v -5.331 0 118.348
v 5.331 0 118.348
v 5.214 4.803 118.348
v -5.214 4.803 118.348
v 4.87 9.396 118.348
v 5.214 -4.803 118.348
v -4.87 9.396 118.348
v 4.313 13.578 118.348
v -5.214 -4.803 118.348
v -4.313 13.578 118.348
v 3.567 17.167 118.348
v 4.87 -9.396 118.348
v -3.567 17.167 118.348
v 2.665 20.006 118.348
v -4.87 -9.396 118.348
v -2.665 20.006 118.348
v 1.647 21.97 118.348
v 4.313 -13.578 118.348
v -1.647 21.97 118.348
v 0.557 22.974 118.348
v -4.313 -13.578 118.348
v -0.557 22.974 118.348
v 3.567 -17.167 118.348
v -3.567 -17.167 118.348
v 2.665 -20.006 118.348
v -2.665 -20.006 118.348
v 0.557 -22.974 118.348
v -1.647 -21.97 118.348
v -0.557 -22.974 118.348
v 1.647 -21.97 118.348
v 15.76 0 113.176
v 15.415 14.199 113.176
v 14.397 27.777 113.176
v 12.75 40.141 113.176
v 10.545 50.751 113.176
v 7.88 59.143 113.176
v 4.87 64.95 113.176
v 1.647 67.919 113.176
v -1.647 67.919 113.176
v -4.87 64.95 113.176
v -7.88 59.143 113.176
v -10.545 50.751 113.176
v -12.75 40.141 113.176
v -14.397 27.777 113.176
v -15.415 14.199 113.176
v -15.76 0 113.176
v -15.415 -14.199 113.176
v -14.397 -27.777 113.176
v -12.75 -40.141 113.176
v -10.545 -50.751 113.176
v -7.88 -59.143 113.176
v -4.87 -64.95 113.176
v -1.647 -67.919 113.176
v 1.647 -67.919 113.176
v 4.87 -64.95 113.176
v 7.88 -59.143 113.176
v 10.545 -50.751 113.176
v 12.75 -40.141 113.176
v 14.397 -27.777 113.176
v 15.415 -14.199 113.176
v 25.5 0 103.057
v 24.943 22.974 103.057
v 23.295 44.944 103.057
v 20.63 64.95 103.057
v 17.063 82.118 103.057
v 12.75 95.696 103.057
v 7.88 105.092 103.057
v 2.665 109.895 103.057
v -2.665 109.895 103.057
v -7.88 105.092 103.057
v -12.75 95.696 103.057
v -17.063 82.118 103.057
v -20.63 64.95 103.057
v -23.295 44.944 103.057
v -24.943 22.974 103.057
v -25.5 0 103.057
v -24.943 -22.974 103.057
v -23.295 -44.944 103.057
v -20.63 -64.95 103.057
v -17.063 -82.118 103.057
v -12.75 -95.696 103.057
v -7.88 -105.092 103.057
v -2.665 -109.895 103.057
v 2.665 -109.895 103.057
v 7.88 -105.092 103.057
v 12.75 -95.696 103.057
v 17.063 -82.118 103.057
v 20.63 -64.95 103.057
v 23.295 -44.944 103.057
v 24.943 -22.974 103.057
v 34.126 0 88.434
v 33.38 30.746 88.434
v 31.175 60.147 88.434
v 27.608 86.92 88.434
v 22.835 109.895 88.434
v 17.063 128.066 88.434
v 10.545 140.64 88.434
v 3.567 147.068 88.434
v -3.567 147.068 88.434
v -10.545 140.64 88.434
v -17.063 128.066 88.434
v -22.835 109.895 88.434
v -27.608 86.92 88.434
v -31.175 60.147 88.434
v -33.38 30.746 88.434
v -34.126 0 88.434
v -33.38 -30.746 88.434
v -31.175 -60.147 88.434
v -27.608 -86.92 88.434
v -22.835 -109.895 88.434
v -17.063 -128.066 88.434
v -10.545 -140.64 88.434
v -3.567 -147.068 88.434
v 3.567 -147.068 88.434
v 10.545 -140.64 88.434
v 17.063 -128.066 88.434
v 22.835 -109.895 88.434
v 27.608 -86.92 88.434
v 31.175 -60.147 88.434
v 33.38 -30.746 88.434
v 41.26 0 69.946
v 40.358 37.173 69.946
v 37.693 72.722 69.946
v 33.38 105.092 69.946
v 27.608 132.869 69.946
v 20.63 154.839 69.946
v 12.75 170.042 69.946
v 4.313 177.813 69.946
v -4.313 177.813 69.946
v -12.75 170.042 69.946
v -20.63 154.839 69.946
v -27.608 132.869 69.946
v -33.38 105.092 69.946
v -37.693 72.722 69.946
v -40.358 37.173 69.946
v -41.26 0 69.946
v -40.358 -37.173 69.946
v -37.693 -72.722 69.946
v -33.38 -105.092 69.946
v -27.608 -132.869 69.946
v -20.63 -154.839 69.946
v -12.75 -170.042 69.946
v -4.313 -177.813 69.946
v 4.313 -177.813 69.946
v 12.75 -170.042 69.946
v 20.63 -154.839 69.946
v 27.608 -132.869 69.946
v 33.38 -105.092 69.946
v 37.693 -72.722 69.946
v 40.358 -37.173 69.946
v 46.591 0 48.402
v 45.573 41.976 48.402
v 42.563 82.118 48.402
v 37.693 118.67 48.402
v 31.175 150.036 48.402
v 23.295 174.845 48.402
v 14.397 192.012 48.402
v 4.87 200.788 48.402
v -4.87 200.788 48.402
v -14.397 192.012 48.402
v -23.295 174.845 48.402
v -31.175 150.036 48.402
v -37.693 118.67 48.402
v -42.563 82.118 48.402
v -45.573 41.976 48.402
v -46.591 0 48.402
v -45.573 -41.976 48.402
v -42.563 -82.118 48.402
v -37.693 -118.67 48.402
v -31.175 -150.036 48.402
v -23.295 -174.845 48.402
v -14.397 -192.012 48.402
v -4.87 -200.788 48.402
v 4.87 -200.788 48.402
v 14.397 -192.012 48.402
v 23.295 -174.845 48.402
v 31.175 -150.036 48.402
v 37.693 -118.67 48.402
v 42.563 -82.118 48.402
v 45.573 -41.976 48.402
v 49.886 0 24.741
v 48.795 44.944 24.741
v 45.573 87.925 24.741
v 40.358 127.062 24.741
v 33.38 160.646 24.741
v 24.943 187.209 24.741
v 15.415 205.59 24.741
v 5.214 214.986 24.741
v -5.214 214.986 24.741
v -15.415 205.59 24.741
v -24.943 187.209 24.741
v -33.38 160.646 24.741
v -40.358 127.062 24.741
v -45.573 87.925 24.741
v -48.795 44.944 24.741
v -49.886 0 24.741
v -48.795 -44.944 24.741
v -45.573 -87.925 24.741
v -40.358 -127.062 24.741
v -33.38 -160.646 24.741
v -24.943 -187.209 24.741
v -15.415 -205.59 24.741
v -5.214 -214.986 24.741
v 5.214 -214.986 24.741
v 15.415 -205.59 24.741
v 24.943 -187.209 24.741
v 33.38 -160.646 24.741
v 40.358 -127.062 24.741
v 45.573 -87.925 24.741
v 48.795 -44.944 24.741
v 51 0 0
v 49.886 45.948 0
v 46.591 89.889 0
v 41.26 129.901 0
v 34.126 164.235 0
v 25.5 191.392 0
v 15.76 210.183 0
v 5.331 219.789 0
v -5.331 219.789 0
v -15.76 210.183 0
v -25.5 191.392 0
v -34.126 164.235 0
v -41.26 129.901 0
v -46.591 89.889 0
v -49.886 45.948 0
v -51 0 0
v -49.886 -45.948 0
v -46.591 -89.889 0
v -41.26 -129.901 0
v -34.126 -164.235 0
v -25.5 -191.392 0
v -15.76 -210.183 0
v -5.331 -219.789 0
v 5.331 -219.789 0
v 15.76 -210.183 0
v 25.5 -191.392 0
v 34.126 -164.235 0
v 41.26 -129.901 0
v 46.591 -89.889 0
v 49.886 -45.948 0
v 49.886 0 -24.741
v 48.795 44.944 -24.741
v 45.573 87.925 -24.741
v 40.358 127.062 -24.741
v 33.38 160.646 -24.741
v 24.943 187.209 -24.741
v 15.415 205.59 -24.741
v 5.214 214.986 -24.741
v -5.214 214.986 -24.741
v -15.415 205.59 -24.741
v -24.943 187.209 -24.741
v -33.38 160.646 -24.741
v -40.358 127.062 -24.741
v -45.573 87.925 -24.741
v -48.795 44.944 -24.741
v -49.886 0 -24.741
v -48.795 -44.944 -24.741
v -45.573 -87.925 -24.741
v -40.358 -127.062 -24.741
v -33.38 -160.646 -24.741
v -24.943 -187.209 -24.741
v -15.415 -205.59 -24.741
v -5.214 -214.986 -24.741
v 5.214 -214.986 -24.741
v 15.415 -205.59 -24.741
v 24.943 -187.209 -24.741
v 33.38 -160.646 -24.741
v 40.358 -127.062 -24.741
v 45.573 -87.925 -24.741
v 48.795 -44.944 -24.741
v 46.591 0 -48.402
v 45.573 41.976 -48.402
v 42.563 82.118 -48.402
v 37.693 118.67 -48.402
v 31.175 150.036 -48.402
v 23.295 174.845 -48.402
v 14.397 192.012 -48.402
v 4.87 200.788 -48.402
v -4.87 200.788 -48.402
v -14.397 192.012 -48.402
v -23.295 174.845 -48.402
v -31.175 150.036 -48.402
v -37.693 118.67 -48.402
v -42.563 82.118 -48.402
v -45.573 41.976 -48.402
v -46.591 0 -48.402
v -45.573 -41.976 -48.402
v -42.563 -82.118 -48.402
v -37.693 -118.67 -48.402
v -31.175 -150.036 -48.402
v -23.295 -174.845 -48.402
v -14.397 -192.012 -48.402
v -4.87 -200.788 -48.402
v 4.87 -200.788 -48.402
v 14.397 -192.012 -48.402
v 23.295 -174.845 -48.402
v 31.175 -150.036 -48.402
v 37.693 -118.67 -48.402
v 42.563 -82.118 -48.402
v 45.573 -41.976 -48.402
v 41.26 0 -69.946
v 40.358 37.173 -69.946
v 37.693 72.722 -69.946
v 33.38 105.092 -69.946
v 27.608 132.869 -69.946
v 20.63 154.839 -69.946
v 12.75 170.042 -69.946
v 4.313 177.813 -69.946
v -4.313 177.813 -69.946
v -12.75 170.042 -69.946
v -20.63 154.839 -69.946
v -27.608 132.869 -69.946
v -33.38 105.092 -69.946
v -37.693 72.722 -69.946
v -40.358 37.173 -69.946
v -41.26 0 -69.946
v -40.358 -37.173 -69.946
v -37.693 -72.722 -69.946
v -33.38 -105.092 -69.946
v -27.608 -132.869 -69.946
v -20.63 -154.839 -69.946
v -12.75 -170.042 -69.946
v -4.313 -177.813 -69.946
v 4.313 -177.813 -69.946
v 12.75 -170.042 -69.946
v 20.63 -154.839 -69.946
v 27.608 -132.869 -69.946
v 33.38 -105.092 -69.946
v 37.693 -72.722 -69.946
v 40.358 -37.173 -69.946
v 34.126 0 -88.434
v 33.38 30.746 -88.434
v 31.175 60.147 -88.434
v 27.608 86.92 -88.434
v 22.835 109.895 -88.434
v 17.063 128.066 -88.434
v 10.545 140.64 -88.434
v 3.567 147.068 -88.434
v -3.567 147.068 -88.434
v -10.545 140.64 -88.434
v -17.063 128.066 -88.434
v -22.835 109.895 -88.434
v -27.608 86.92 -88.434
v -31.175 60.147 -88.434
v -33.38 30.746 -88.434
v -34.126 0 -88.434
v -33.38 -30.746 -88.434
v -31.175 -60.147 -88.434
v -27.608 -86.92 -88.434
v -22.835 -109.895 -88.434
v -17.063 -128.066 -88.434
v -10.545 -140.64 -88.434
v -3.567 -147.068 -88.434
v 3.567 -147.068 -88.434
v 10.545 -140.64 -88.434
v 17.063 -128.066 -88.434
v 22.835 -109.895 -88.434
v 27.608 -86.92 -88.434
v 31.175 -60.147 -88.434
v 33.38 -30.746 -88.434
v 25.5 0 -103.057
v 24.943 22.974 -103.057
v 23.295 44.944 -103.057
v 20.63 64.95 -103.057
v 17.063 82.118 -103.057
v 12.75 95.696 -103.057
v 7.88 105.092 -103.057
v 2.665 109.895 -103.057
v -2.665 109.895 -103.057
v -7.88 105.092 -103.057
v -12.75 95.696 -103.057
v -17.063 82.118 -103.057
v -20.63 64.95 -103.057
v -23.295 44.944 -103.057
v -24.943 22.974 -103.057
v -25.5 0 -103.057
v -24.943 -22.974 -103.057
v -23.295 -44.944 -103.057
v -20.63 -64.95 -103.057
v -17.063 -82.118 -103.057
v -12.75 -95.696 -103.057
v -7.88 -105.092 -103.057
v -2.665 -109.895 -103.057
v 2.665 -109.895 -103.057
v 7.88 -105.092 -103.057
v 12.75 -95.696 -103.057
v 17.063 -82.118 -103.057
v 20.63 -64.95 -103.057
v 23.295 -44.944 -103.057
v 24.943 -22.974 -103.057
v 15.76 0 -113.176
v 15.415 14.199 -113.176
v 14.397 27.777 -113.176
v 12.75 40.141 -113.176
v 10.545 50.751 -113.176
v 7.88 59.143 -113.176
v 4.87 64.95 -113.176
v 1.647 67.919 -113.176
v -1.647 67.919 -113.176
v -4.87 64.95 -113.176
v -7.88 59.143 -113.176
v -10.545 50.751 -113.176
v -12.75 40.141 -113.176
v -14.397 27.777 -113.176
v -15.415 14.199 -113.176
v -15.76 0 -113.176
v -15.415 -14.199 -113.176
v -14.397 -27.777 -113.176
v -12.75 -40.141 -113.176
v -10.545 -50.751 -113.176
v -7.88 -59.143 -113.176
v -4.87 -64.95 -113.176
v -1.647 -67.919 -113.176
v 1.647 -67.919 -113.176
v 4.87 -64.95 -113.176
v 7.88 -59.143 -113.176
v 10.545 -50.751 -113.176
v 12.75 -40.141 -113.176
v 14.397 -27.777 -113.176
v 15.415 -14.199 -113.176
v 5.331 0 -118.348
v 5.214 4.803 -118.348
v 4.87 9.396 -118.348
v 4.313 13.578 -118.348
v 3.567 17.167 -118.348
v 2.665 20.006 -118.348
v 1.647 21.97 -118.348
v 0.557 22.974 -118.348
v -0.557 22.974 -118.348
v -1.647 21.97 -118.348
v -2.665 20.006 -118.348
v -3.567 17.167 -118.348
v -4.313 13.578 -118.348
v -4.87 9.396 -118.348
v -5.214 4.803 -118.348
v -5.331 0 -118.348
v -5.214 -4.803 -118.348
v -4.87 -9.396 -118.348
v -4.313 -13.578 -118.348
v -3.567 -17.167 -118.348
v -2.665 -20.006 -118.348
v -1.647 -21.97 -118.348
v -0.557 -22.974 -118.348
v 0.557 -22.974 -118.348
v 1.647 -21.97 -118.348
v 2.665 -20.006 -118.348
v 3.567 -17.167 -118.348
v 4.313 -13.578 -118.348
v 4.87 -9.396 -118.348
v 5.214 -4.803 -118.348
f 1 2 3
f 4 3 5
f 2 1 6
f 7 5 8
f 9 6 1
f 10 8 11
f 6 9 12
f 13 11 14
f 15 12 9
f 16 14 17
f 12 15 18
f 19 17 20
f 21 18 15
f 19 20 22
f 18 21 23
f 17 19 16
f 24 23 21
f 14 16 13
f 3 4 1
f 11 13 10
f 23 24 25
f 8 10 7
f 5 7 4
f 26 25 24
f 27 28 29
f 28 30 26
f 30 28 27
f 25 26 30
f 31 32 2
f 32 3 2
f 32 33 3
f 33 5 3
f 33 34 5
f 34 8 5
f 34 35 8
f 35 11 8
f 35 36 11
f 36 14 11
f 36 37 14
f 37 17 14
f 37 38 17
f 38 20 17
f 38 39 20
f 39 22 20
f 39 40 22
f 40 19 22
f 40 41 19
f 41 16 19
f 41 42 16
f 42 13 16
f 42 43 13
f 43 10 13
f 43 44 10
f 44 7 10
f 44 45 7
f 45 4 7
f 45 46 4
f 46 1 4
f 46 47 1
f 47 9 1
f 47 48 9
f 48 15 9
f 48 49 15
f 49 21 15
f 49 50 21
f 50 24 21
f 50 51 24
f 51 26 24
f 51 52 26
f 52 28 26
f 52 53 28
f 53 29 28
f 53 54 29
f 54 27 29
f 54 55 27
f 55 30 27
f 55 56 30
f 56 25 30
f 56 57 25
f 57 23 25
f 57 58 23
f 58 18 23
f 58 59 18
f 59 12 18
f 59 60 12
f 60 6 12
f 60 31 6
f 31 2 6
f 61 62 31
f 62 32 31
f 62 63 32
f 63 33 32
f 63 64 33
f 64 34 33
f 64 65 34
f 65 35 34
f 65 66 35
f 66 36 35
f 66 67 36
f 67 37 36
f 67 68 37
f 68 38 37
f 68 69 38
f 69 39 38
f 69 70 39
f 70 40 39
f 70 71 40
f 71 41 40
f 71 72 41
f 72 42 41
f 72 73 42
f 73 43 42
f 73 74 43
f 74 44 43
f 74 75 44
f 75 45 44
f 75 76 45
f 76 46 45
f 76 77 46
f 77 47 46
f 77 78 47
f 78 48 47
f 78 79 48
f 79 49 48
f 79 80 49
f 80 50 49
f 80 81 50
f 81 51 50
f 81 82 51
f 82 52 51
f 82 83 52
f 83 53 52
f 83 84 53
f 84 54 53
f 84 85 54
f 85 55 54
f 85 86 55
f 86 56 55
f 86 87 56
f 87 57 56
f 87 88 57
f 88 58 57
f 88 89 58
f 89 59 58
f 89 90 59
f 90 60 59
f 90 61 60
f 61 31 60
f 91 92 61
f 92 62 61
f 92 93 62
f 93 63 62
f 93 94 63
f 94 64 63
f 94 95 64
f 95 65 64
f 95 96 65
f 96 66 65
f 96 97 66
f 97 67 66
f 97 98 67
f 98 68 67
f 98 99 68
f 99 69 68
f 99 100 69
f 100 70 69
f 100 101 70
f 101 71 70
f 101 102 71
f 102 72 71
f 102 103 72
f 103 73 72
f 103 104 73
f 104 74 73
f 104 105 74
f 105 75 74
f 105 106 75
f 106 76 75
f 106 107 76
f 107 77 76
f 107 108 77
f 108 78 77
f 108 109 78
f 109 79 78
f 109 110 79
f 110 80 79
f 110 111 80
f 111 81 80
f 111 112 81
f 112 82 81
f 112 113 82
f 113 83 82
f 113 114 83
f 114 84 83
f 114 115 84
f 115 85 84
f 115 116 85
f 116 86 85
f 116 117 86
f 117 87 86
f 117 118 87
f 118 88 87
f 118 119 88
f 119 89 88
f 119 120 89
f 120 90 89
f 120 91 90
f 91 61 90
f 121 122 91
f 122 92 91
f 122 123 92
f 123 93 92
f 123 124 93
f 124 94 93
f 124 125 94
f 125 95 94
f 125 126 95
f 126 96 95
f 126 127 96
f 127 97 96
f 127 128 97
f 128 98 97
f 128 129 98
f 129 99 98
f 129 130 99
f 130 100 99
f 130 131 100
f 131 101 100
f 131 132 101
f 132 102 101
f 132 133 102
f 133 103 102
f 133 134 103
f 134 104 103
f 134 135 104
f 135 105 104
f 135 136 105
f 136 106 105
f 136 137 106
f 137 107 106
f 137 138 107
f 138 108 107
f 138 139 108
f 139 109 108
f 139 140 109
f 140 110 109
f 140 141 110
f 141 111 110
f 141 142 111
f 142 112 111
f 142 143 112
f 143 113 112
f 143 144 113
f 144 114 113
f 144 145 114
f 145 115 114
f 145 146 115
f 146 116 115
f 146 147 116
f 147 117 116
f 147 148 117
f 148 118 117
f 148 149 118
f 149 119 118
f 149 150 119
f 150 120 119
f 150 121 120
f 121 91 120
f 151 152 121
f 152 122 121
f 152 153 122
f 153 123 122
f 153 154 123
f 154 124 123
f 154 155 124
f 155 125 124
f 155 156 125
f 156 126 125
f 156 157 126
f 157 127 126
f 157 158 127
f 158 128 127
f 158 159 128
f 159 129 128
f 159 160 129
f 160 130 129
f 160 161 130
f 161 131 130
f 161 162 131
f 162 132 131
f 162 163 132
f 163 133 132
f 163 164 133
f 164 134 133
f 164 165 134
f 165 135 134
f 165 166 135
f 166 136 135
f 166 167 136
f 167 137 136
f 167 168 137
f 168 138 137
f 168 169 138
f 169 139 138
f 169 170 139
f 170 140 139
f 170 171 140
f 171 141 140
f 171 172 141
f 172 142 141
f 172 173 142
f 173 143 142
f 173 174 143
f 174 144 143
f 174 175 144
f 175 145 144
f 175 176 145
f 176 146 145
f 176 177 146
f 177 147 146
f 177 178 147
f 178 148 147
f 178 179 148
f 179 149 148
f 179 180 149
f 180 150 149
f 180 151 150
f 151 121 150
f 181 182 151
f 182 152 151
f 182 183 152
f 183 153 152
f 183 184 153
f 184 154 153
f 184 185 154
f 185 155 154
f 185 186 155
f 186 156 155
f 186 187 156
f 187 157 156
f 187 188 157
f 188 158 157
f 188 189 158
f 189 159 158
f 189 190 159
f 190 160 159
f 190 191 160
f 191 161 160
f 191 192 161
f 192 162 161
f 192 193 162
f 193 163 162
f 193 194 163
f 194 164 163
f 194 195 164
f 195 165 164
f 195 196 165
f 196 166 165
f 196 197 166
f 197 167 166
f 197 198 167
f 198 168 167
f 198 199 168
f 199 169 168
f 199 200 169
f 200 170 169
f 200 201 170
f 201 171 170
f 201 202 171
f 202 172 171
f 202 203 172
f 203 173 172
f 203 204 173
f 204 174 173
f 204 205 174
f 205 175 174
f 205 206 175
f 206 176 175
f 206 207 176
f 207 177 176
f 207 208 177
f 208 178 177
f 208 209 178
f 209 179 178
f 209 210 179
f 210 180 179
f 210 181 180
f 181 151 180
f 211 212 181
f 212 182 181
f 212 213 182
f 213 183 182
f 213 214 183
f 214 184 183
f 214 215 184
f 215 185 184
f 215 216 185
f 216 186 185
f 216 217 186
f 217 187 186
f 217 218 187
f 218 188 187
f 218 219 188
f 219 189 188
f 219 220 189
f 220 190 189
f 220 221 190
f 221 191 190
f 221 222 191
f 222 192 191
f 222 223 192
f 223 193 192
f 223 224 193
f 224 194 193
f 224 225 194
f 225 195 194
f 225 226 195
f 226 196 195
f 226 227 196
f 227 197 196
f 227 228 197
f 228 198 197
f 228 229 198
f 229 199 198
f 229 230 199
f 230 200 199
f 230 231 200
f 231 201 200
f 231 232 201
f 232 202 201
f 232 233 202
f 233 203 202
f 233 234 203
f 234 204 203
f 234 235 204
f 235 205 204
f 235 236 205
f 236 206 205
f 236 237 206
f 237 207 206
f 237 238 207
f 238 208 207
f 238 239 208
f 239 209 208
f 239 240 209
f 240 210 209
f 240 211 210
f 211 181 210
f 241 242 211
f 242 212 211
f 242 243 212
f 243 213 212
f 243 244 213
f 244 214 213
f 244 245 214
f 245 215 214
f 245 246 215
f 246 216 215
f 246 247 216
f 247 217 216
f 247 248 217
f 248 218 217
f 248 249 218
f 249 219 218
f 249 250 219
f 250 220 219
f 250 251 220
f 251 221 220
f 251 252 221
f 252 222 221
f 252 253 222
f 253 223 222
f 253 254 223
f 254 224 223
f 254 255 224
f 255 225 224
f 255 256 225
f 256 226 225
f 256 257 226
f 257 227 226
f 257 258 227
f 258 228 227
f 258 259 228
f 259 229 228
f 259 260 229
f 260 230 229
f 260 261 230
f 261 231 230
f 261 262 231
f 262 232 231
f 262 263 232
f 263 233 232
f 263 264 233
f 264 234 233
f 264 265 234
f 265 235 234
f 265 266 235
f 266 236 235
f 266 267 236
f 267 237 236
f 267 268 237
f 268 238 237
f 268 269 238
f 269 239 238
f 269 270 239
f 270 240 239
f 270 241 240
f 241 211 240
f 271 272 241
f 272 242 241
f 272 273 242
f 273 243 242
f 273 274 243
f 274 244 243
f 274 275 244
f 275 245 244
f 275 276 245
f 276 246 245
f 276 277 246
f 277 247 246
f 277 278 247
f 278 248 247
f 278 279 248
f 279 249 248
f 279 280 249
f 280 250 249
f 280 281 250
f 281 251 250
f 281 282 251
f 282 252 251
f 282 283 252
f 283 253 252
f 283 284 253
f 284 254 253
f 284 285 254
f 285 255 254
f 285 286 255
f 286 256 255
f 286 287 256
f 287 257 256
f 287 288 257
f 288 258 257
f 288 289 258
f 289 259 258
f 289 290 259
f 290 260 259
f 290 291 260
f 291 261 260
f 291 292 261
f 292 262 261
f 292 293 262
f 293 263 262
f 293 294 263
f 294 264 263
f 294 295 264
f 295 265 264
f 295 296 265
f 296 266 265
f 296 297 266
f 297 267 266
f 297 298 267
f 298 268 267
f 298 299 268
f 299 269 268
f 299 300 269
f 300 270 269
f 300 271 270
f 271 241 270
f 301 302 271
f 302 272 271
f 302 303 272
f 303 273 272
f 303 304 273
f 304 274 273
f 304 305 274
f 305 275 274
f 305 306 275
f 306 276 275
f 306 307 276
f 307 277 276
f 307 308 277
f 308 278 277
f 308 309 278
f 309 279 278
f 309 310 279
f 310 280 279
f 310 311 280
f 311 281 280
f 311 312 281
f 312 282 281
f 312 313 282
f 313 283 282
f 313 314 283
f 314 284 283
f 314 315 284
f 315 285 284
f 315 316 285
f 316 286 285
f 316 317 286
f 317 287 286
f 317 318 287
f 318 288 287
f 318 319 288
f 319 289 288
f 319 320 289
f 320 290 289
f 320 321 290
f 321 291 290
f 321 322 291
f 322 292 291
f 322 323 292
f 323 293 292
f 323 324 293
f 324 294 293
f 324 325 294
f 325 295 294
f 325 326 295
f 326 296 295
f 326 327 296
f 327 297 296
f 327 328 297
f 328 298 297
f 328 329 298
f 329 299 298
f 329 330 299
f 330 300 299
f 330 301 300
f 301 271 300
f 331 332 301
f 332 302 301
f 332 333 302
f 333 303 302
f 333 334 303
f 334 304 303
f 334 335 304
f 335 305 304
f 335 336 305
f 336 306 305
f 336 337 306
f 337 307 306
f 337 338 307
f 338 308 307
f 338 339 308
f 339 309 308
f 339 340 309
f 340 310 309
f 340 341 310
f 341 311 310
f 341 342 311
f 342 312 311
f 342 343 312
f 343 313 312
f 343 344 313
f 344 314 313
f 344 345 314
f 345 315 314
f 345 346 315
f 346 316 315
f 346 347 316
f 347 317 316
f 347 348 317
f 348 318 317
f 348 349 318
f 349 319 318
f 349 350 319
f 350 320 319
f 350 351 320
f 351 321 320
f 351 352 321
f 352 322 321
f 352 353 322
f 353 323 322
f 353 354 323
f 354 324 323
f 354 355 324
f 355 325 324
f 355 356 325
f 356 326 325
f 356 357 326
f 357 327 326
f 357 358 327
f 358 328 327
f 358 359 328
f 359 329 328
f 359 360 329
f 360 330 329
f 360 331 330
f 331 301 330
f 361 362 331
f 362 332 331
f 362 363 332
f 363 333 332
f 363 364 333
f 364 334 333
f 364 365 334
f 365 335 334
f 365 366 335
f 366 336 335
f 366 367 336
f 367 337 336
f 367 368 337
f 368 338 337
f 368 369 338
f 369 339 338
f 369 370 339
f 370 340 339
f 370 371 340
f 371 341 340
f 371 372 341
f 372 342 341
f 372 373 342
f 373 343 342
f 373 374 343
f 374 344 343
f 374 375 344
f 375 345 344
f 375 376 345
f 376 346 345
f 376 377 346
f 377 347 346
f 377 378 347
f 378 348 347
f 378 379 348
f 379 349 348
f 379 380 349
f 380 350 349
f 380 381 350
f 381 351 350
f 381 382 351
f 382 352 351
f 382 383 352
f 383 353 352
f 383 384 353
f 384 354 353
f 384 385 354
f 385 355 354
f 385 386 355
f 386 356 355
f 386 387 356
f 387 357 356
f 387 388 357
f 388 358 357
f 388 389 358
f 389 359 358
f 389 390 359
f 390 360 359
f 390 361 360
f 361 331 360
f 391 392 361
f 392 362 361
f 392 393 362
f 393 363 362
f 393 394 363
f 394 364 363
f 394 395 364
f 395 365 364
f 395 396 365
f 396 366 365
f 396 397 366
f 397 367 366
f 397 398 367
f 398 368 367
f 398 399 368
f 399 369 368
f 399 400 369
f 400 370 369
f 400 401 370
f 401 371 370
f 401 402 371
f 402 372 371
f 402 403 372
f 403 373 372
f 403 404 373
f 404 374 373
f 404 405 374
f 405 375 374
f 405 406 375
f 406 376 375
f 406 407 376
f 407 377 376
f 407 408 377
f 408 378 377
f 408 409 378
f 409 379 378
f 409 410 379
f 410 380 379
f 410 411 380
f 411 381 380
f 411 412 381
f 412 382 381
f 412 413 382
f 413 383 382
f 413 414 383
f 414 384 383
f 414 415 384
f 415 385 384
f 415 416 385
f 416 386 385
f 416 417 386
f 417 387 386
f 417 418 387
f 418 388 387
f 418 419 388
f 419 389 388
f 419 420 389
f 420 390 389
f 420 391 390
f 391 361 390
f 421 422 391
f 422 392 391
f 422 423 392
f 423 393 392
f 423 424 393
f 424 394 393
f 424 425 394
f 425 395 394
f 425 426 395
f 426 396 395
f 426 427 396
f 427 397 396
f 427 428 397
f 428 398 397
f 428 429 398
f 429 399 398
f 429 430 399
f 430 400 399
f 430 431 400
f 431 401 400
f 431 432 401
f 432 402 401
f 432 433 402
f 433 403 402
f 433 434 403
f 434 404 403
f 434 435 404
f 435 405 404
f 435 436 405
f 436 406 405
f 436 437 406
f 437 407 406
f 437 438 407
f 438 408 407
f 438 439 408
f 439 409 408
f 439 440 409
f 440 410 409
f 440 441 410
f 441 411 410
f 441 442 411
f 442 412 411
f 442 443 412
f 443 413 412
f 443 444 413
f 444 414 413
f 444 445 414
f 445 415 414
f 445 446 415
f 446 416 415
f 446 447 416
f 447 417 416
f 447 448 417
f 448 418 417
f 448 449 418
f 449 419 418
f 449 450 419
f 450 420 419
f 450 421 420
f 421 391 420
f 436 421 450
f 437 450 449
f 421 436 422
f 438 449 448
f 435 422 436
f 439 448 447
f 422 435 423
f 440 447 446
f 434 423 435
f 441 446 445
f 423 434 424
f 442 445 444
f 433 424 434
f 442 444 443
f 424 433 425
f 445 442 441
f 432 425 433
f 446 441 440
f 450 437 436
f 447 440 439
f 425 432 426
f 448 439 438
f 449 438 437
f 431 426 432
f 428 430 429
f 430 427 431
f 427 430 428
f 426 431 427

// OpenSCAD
// Generated by SolidPython 1.0.1 on 2020-07-29 00:46:45


scale(v = [3, 13, 7]) {
	sphere(r = 17);
}
/***********************************************
*********      SolidPython code:      **********
************************************************
 
# import packages: SolidPython
from solid import *
from solid.utils import *
from itertools import chain, combinations, permutations


class Resize:

    def __init__(self, scad_file):
        self.scad_file = scad_file
        #self.scad_file = import_scad(scad_file)
        # cone/cylinder param:
        self.r1 = 0
        self.r2 = 0
        self.h = 0
        # rectangular prism param:
        self.w = 0
        self.l = 0
        # ellipse param:
        self.r = 0

    # import OpenScad code (file name corresponds to shape)


    # classify shape + parameters
    def assign(self, param1, param2, param3):
        if self.scad_file == 'cone.scad':
            self.r1 = param1
            self.r2 = param2
            self.h = param3
        elif self.scad_file == 'cylinder.scad':
            self.r1 = param1
            self.r2 = param2
            self.h = param3
        elif self.scad_file == 'rectangularPrism.scad':
            self.h = param1
            self.l = param2
            self.w = param3
        else:
            self.r = param1
            self.h = param2

    # resize parameters
    def iterate(self):
        x = range(3, 20, 2)
        i = 1
        if self.scad_file == 'cone.scad':
            tempList = list(permutations(x, 2))
            for temp in tempList:
                param1 = temp[0]
                param2 = temp[1]
                filepath = 'produced_scad_files/' + 'cone' + str(param1) + '_' + str(param2) + '_' + '.scad'
                scad_render_to_file(cylinder(h=param1, r1=param2, r2=0), filepath)

        elif self.scad_file == 'cylinder.scad':
            tempList = list(permutations(x, 3))
            for temp in tempList:
                param1 = temp[0]
                param2 = temp[1]
                filepath = 'produced_scad_files/' + 'cylinder' + str(param1) + '_' + str(param2) + '_' + '.scad'
                scad_render_to_file(cylinder(h=param1, r1=param2, r2=param2), filepath)

        elif self.scad_file == 'rectangularPrism.scad':
            tempList = list(permutations(x, 3))
            for temp in tempList:
                param1 = temp[0]
                param2 = temp[1]
                param3 = temp[2]
                filepath = 'produced_scad_files/' + 'rectangularPrism' + str(param1) + '_' + str(param2) + '_' + str(
                    param3) + '.scad'
                scad_render_to_file(cube(size=(param1, param2, param3)), filepath)

        elif self.scad_file == 'ellipse.scad':
            tempList = list(permutations(x, 4))
            for temp in tempList:
                param1 = temp[0]
                param2 = temp[1]
                param3 = temp[2]
                param4 = temp[3]
                filepath = 'produced_scad_files/' + 'ellipse' + str(param1) + '_' + str(param2) + '_' + str(param3) + '_' + str(param4) + '.scad'
                scad_render_to_file(scale([param1, param2, param3])(sphere(r=param4)), filepath)

    def render_to_scadfile(self):
        scad_render_to_file(scad, 'example.scad') 
 
************************************************/
